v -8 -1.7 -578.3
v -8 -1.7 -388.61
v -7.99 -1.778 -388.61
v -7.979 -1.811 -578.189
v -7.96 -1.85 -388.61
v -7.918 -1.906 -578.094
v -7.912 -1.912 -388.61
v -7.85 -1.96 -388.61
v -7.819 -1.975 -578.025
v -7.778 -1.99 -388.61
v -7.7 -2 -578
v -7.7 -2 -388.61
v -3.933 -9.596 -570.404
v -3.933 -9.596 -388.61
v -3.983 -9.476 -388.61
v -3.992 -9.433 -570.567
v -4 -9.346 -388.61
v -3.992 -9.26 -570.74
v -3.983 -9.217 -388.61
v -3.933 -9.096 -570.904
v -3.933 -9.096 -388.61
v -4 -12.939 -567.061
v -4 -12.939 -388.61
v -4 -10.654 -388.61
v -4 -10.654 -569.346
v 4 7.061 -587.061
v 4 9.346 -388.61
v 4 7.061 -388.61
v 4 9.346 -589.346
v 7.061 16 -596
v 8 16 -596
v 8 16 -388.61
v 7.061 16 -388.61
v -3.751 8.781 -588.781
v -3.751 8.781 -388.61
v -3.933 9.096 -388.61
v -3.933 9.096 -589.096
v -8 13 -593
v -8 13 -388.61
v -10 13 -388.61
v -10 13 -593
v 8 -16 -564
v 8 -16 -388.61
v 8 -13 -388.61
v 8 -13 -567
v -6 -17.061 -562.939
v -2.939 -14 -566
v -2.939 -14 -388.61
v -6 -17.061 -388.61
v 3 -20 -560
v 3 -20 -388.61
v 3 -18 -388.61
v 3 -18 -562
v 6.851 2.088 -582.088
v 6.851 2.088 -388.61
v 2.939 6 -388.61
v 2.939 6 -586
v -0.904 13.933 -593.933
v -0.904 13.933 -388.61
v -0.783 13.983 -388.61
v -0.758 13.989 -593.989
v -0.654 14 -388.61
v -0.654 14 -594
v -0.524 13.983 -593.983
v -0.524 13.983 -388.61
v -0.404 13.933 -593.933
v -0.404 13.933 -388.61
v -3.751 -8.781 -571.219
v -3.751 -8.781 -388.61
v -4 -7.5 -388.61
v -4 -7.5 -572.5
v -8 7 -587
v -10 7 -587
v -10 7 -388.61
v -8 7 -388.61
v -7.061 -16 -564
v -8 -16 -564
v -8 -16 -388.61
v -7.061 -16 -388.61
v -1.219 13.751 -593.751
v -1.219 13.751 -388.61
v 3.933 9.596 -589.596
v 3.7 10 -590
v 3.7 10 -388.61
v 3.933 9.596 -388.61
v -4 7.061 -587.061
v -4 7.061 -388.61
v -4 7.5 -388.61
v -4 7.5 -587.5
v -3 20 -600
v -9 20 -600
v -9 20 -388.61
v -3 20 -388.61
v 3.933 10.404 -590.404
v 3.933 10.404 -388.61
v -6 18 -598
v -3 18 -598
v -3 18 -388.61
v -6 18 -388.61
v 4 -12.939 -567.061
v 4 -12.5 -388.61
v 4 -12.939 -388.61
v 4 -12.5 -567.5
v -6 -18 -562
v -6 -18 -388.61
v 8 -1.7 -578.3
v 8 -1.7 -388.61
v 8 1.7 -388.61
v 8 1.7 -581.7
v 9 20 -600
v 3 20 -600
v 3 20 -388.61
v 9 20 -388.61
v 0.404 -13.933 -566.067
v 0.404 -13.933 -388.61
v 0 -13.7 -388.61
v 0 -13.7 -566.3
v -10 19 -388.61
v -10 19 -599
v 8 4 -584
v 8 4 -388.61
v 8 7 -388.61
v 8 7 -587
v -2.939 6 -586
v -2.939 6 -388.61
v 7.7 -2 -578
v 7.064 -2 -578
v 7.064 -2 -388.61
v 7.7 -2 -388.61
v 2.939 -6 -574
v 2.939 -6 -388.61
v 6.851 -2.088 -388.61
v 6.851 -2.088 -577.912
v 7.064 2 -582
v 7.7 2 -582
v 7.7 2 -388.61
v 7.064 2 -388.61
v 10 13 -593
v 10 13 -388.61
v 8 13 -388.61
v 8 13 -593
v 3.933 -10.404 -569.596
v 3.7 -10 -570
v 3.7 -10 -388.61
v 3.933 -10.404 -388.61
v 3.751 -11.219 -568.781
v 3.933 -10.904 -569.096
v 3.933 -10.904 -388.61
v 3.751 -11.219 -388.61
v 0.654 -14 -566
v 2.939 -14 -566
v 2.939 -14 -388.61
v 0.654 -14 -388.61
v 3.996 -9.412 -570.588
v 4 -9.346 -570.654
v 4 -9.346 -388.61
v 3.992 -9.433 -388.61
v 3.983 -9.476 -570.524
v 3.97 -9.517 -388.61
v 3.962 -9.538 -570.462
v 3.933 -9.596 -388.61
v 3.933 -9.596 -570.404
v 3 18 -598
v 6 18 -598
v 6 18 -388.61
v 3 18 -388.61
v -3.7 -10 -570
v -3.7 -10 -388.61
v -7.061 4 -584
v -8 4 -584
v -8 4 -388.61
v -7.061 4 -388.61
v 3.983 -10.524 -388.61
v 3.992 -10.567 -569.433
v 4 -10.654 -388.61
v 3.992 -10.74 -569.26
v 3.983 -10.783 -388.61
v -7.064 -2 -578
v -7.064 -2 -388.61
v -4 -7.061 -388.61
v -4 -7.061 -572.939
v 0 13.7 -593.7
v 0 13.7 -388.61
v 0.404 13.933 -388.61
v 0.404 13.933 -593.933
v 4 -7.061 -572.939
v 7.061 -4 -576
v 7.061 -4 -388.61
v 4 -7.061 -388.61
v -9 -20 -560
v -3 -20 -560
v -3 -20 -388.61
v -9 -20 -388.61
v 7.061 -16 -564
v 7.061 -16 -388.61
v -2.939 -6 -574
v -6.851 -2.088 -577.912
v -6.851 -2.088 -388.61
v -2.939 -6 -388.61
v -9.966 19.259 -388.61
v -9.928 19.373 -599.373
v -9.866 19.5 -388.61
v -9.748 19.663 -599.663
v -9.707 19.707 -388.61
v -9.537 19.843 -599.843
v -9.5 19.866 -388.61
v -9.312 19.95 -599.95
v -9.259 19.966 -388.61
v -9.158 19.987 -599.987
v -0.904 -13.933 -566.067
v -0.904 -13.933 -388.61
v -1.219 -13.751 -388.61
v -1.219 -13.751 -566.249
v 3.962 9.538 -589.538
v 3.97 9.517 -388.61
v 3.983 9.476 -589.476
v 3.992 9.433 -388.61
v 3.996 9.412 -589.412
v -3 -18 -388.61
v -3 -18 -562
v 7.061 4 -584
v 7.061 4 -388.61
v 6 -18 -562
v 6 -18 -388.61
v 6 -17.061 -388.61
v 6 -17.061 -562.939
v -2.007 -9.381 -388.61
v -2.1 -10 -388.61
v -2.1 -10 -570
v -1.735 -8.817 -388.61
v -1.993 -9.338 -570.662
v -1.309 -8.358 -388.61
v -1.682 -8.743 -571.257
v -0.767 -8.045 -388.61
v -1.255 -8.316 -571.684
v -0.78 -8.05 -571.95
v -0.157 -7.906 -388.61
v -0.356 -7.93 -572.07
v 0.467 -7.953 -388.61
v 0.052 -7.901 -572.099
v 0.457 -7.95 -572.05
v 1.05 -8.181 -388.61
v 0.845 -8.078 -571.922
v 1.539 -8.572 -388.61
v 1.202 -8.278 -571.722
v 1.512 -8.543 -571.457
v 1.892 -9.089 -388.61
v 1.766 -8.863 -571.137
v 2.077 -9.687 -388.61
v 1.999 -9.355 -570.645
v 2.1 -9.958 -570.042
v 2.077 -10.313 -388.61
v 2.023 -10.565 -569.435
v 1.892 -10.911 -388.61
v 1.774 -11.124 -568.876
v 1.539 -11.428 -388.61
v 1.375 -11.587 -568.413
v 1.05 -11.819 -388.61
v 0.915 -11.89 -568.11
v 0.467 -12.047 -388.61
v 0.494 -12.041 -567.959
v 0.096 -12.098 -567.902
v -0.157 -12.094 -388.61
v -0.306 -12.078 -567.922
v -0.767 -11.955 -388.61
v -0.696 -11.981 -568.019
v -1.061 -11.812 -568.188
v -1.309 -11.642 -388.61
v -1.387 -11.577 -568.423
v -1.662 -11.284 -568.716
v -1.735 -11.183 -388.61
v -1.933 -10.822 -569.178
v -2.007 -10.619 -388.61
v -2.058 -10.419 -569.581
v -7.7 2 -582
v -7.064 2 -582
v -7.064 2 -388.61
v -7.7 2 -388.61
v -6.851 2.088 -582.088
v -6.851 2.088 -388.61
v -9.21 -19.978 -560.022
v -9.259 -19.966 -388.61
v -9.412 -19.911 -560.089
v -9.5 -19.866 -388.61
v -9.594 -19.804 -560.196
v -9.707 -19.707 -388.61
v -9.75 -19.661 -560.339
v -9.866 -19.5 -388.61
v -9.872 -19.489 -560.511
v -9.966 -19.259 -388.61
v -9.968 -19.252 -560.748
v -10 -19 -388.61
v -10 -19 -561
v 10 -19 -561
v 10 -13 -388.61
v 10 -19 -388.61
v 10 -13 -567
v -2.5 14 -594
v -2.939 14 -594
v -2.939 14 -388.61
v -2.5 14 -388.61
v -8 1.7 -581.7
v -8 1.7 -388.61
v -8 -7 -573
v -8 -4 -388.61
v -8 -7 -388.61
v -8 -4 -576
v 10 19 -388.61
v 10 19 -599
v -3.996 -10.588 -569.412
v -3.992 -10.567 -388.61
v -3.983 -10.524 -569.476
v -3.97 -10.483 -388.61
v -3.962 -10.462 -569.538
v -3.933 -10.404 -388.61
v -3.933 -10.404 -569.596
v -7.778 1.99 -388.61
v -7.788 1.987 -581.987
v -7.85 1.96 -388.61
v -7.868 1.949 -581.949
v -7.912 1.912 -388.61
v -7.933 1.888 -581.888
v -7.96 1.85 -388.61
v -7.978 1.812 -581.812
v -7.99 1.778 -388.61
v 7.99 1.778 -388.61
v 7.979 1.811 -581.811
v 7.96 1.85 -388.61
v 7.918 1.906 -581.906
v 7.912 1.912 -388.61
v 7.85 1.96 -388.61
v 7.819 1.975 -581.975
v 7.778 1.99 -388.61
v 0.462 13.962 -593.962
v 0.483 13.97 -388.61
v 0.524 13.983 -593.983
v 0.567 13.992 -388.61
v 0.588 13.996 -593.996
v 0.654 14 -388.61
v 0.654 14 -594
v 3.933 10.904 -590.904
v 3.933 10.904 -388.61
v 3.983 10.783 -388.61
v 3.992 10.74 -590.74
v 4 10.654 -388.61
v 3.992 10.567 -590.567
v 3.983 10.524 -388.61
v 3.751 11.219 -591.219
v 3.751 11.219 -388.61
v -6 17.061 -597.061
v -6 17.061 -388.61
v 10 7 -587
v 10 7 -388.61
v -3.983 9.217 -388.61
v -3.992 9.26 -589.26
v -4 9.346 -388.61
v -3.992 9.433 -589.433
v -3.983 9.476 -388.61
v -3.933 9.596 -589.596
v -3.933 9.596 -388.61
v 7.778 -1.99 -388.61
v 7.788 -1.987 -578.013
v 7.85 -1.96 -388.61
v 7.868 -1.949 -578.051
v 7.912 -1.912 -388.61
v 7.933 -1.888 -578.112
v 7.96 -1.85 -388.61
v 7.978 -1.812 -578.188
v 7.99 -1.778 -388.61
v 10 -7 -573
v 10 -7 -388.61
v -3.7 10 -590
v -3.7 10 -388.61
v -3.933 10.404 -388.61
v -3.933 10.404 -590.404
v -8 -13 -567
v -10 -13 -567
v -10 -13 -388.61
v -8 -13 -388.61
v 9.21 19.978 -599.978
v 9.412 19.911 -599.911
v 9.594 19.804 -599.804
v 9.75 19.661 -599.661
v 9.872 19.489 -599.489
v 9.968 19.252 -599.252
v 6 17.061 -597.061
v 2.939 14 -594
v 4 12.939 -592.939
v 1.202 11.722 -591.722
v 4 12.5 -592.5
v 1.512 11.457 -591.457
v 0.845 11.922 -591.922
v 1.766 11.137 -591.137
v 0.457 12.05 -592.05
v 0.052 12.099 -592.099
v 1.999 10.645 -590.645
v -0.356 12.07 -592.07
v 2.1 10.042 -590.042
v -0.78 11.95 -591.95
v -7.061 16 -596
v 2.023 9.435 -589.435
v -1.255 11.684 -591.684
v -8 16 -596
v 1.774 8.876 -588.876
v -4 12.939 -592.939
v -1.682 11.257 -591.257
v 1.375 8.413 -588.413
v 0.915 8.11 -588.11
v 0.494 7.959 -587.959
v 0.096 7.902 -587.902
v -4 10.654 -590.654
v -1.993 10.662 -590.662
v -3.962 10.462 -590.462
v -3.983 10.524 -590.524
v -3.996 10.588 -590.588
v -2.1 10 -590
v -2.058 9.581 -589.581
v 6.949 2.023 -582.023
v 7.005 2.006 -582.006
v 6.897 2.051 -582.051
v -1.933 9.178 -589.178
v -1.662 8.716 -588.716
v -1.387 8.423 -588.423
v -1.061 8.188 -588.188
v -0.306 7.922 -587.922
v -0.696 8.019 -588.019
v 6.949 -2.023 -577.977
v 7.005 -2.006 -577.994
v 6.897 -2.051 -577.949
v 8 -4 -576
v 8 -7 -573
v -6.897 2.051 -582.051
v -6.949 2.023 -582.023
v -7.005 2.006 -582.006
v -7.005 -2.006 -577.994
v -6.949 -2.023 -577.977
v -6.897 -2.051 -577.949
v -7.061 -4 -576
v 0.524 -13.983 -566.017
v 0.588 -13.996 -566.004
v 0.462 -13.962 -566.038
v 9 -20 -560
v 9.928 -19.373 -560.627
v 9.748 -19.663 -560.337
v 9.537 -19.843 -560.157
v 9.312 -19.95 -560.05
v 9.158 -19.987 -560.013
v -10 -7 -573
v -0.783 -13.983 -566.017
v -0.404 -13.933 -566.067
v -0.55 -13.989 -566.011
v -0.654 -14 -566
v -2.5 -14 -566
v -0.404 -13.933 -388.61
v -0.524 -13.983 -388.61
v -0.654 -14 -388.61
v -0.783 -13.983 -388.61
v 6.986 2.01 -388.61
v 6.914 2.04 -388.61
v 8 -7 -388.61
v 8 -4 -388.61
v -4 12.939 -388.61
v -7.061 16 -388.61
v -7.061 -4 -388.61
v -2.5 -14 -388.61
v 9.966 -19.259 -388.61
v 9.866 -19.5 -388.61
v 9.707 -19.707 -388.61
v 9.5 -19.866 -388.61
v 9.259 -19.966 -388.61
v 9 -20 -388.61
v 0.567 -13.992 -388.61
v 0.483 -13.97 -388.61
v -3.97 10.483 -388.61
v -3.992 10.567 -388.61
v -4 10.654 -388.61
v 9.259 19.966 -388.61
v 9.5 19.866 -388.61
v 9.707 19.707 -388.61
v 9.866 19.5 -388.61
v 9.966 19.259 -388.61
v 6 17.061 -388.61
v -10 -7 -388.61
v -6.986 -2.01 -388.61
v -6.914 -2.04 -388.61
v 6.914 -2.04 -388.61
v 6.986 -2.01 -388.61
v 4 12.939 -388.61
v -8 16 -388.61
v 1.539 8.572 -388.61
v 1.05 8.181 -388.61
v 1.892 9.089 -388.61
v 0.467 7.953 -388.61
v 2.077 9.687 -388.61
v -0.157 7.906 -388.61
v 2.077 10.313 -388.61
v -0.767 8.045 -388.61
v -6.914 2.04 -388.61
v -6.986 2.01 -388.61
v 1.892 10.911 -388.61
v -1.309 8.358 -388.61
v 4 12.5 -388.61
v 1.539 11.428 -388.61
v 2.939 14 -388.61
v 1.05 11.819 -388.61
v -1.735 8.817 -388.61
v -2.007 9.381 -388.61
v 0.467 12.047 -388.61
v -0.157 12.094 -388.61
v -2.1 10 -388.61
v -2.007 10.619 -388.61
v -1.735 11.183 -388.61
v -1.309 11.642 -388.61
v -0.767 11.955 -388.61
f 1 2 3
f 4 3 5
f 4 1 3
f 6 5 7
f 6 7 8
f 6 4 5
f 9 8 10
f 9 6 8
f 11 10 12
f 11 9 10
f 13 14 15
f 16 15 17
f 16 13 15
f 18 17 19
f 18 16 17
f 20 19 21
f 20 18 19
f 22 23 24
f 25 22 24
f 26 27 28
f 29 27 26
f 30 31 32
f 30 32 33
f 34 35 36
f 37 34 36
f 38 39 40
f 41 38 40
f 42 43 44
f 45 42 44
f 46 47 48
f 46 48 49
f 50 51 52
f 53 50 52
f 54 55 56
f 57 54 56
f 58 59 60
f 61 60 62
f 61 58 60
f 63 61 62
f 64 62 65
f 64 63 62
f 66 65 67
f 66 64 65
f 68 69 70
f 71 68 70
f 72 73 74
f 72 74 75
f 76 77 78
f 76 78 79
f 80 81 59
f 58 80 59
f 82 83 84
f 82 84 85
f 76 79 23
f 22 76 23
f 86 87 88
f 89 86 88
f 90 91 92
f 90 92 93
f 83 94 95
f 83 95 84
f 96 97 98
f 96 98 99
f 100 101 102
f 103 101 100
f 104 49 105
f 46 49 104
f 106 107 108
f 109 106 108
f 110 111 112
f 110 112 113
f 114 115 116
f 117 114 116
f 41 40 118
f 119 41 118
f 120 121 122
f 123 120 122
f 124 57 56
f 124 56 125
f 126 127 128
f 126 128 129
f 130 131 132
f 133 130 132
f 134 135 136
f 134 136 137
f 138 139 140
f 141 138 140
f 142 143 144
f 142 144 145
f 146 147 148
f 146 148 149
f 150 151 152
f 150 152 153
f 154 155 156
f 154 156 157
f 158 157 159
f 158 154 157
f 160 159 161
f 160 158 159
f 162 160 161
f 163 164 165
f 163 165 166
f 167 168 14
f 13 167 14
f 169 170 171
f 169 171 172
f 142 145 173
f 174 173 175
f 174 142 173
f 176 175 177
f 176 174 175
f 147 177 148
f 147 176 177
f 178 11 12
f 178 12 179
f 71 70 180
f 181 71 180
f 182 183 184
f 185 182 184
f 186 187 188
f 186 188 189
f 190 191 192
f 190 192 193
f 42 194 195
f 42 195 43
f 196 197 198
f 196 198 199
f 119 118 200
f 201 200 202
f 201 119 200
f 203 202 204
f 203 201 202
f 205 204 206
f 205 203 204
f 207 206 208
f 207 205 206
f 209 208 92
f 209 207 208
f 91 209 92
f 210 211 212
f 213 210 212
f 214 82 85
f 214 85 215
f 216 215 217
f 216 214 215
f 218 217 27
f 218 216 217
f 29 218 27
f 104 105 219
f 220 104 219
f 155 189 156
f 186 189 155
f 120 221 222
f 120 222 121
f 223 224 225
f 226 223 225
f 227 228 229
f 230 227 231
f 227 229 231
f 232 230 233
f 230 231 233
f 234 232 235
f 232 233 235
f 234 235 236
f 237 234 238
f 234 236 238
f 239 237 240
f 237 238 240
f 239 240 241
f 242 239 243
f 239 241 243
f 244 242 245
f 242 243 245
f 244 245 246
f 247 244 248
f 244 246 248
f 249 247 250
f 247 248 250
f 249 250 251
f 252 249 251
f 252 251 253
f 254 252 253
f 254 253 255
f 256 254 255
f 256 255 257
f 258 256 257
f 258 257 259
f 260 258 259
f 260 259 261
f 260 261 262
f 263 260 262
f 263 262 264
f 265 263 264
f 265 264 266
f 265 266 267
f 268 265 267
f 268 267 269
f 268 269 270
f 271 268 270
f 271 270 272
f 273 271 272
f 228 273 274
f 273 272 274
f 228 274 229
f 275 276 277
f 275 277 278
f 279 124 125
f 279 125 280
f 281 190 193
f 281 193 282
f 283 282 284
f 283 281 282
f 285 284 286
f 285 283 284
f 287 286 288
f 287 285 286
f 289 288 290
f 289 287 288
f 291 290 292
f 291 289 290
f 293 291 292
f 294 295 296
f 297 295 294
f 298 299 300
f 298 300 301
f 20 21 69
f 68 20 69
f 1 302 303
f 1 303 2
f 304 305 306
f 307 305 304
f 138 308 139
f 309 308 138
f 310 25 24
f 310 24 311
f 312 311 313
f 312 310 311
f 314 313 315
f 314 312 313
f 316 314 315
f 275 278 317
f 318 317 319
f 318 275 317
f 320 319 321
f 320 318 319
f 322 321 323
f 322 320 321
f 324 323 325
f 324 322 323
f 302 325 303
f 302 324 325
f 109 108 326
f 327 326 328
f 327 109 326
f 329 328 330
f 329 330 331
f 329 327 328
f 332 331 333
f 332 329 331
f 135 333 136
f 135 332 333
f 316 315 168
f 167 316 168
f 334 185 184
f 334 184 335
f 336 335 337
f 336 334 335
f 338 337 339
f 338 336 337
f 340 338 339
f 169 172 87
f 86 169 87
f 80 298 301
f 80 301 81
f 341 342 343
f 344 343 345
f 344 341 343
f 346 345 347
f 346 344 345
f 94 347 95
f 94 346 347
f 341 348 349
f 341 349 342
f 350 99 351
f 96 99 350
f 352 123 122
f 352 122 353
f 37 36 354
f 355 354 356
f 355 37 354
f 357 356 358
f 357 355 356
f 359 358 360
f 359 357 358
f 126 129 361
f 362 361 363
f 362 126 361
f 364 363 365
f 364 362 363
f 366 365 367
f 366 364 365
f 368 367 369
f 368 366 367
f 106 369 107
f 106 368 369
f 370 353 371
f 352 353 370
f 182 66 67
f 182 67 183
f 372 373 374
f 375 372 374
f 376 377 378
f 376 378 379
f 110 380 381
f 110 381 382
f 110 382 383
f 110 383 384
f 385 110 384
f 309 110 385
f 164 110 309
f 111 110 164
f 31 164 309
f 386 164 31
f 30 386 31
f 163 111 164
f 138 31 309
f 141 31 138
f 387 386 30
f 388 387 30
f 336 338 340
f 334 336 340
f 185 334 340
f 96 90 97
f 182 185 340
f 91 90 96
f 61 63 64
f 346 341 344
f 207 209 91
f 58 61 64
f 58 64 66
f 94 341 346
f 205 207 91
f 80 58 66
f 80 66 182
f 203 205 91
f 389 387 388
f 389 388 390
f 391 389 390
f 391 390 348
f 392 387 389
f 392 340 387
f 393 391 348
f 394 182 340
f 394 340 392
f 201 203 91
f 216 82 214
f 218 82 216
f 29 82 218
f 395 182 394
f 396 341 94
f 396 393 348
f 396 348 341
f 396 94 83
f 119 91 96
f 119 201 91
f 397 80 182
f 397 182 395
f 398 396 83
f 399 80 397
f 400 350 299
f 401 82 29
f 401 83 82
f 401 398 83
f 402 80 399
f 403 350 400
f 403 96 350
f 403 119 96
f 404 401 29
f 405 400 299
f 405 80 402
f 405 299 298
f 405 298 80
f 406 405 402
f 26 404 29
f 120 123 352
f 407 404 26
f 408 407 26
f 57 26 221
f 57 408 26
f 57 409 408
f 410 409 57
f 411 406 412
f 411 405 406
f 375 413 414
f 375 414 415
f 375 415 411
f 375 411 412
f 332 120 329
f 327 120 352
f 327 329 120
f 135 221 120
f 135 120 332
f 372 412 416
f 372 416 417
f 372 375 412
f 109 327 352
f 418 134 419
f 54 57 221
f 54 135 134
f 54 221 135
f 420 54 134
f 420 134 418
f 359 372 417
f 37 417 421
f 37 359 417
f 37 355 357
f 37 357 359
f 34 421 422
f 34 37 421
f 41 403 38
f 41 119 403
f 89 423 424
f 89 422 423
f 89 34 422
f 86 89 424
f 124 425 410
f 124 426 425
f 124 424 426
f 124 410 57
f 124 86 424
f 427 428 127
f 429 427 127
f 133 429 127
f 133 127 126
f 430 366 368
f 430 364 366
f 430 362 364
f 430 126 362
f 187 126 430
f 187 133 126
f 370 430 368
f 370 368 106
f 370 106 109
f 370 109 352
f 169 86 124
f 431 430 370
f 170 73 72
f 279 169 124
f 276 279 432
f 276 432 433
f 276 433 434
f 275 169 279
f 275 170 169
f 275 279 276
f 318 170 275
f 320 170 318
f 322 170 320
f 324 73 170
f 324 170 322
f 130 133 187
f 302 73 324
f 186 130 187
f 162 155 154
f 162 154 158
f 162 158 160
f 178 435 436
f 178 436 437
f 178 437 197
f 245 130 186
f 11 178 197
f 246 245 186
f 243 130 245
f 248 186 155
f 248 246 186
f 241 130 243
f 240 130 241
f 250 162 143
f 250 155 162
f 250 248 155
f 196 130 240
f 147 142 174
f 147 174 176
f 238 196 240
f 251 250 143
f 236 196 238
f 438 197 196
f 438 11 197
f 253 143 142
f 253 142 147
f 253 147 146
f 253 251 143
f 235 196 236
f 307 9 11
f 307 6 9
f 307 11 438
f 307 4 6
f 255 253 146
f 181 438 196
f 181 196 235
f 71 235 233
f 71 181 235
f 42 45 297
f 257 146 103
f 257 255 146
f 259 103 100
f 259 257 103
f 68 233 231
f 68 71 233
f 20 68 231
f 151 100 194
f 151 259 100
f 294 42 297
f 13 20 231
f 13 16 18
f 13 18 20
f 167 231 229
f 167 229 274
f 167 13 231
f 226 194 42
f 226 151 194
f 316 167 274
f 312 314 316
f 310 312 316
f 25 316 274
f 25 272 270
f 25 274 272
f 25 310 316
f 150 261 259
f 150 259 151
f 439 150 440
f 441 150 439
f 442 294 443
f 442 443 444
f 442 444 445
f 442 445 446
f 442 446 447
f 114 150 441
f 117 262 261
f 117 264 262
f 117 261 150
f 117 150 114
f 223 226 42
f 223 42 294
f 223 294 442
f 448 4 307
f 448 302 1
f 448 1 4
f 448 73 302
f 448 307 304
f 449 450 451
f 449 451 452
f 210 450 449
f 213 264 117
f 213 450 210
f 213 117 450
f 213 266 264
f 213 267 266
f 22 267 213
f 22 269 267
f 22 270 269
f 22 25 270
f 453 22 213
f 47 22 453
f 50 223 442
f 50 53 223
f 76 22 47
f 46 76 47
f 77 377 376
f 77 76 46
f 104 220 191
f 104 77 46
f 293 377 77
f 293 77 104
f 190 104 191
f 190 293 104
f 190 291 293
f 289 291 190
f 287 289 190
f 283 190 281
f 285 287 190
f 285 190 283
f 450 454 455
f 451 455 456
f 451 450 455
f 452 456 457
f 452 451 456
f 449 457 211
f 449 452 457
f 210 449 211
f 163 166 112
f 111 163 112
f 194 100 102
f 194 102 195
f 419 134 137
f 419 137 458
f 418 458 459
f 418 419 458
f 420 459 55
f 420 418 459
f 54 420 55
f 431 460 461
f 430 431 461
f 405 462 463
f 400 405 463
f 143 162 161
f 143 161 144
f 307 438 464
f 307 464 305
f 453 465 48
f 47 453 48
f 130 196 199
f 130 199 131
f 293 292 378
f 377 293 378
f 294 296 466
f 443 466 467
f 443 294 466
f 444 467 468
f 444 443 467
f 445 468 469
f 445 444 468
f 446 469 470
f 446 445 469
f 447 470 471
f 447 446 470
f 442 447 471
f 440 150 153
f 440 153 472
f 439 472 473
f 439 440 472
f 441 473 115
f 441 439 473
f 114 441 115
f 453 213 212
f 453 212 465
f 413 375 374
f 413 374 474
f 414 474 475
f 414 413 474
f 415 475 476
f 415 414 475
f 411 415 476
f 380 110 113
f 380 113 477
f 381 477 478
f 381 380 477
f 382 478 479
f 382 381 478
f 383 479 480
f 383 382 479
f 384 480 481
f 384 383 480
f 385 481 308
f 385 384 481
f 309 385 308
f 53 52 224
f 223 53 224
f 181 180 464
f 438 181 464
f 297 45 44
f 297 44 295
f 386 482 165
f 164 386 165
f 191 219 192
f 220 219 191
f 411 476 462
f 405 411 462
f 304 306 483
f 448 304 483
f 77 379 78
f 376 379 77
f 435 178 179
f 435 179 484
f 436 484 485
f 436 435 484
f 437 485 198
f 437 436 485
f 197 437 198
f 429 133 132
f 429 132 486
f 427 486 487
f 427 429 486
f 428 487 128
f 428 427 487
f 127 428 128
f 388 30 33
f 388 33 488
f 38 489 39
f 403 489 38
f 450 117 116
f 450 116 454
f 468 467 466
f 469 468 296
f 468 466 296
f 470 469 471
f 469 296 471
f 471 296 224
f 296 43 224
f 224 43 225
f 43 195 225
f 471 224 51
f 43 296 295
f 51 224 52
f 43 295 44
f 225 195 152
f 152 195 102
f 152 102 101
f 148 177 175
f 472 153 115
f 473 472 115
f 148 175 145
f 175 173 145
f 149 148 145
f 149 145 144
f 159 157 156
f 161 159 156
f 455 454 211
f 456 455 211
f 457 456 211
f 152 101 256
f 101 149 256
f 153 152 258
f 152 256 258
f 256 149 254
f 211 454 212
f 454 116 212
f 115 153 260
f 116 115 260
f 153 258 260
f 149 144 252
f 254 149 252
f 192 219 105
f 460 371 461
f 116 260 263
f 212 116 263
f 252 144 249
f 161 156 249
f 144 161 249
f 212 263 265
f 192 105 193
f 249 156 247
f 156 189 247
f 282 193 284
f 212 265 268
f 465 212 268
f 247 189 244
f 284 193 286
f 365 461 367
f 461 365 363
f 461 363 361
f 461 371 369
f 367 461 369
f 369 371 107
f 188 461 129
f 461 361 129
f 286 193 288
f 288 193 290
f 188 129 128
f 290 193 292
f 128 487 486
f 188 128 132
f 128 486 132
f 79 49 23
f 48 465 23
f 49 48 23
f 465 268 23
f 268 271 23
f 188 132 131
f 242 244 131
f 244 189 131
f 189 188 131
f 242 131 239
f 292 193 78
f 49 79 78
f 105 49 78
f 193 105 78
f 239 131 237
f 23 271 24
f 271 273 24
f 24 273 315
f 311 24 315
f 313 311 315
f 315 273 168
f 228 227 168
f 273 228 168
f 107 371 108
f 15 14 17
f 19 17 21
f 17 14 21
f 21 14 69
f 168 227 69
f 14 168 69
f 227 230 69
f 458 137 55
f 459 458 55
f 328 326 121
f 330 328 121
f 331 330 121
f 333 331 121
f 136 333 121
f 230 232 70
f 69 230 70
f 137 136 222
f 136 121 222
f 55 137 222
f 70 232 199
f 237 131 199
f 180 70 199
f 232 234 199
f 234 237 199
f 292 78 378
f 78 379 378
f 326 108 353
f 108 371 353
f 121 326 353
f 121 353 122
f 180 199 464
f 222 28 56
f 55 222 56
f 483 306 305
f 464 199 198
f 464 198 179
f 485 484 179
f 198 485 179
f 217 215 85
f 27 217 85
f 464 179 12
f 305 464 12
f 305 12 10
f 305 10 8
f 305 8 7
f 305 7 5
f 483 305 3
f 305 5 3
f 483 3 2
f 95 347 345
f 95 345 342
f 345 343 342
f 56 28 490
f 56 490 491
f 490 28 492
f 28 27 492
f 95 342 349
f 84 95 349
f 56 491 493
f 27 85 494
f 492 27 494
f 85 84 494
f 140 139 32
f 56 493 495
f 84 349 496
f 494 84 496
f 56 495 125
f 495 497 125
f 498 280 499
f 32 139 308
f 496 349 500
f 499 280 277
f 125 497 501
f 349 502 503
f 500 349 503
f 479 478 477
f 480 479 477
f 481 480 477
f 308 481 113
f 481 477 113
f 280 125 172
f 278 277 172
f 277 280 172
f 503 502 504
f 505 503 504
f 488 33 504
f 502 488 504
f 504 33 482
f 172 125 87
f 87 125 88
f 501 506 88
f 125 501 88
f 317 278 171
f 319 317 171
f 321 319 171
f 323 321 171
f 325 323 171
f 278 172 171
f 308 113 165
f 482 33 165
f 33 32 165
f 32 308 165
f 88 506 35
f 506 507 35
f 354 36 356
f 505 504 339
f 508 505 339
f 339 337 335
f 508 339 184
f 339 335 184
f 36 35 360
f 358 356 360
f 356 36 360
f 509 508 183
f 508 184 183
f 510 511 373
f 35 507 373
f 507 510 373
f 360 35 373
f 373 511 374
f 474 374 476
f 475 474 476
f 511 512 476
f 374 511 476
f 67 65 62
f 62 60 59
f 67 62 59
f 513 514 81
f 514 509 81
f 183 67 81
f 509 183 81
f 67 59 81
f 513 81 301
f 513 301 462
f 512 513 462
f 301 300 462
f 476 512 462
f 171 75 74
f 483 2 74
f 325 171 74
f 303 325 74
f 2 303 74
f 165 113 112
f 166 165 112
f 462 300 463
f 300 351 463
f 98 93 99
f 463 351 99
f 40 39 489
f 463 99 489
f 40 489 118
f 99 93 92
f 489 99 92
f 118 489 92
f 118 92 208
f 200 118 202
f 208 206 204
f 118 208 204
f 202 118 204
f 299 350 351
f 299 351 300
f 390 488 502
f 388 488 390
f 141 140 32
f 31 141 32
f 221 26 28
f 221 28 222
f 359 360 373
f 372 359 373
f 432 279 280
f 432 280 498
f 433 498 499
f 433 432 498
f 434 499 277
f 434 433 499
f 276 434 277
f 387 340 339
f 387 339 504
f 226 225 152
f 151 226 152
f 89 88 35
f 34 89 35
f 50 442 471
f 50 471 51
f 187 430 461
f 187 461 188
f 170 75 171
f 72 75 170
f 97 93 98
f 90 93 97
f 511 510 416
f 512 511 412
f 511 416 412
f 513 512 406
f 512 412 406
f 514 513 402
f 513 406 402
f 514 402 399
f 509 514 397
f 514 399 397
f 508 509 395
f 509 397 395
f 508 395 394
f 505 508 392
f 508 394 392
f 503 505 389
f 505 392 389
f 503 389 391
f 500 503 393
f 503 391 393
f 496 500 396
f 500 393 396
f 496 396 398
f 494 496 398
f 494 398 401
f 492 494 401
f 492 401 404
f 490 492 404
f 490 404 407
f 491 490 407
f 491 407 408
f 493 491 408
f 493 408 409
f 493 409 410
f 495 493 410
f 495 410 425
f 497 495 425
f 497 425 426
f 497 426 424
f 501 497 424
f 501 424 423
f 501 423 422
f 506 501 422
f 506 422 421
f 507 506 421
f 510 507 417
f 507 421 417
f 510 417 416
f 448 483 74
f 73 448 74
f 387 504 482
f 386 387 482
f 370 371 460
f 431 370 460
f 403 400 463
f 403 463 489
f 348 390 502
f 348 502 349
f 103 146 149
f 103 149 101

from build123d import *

# Parameters (mm, degrees)
SKETCH1_R           = 2.1
BOSS_EXTRUDE1_DEPTH = 211.39
CUT_EXTRUDE1_DEPTH  = 21


with BuildPart() as part:
    # Sketch1 → Boss-Extrude1 (new body)
    with BuildSketch(Plane(origin=(0, 0, -600), x_dir=(-1, 0, 0), z_dir=(0, 0, -1))):
        with BuildLine():
            Line((10, -7), (10, 7))
            Line((10, 7), (8, 7))
            Line((8, 7), (8, 4))
            Line((8, 4), (7.060660172, 4))
            Line((7.060660172, 4), (4, 7.060660172))
            Line((4, 7.060660172), (4, 7.5))
            Line((4, 7.5), (3.750976592, 8.781114371))
            Line((3.750976592, 8.781114371), (3.933012702, 9.096410162))
            ThreePointArc((3.933012702, 9.096410162), (4, 9.346410162), (3.933012702, 9.596410162))
            Line((3.933012702, 9.596410162), (3.7, 10))
            Line((3.7, 10), (3.933012702, 10.403589838))
            ThreePointArc((3.933012702, 10.403589838), (3.982962913, 10.524180316), (4, 10.653589838))
            Line((4, 10.653589838), (4, 12.939339828))
            Line((4, 12.939339828), (7.060660172, 16))
            Line((7.060660172, 16), (8, 16))
            Line((8, 16), (8, 13))
            Line((8, 13), (10, 13))
            Line((10, 13), (10, 19))
            ThreePointArc((10, 19), (9.707106781, 19.707106781), (9, 20))
            Line((9, 20), (3, 20))
            Line((3, 20), (3, 18))
            Line((3, 18), (6, 18))
            Line((6, 18), (6, 17.060660172))
            Line((6, 17.060660172), (2.939339828, 14))
            Line((2.939339828, 14), (2.5, 14))
            Line((2.5, 14), (1.218885629, 13.750976592))
            Line((1.218885629, 13.750976592), (0.903589838, 13.933012702))
            ThreePointArc((0.903589838, 13.933012702), (0.653589838, 14), (0.403589838, 13.933012702))
            Line((0.403589838, 13.933012702), (0, 13.7))
            Line((0, 13.7), (-0.403589838, 13.933012702))
            ThreePointArc((-0.403589838, 13.933012702), (-0.524180316, 13.982962913), (-0.653589838, 14))
            Line((-0.653589838, 14), (-2.939339828, 14))
            Line((-2.939339828, 14), (-6, 17.060660172))
            Line((-6, 17.060660172), (-6, 18))
            Line((-6, 18), (-3, 18))
            Line((-3, 18), (-3, 20))
            Line((-3, 20), (-9, 20))
            ThreePointArc((-9, 20), (-9.707106781, 19.707106781), (-10, 19))
            Line((-10, 19), (-10, 13))
            Line((-10, 13), (-8, 13))
            Line((-8, 13), (-8, 16))
            Line((-8, 16), (-7.060660172, 16))
            Line((-7.060660172, 16), (-4, 12.939339828))
            Line((-4, 12.939339828), (-4, 12.5))
            Line((-4, 12.5), (-3.750976592, 11.218885629))
            Line((-3.750976592, 11.218885629), (-3.933012702, 10.903589838))
            ThreePointArc((-3.933012702, 10.903589838), (-4, 10.653589838), (-3.933012702, 10.403589838))
            Line((-3.933012702, 10.403589838), (-3.7, 10))
            Line((-3.7, 10), (-3.933012702, 9.596410162))
            ThreePointArc((-3.933012702, 9.596410162), (-3.982962913, 9.475819684), (-4, 9.346410162))
            Line((-4, 9.346410162), (-4, 7.060660172))
            Line((-4, 7.060660172), (-7.060660172, 4))
            Line((-7.060660172, 4), (-8, 4))
            Line((-8, 4), (-8, 7))
            Line((-8, 7), (-10, 7))
            Line((-10, 7), (-10, -7))
            Line((-10, -7), (-8, -7))
            Line((-8, -7), (-8, -4))
            Line((-8, -4), (-7.060660172, -4))
            Line((-7.060660172, -4), (-4, -7.060660172))
            Line((-4, -7.060660172), (-4, -9.346410162))
            ThreePointArc((-4, -9.346410162), (-3.982962913, -9.475819684), (-3.933012702, -9.596410162))
            Line((-3.933012702, -9.596410162), (-3.7, -10))
            Line((-3.7, -10), (-3.933012702, -10.403589838))
            ThreePointArc((-3.933012702, -10.403589838), (-4, -10.653589838), (-3.933012702, -10.903589838))
            Line((-3.933012702, -10.903589838), (-3.750976592, -11.218885629))
            Line((-3.750976592, -11.218885629), (-4, -12.5))
            Line((-4, -12.5), (-4, -12.939339828))
            Line((-4, -12.939339828), (-7.060660172, -16))
            Line((-7.060660172, -16), (-8, -16))
            Line((-8, -16), (-8, -13))
            Line((-8, -13), (-10, -13))
            Line((-10, -13), (-10, -19))
            ThreePointArc((-10, -19), (-9.707106781, -19.707106781), (-9, -20))
            Line((-9, -20), (-3, -20))
            Line((-3, -20), (-3, -18))
            Line((-3, -18), (-6, -18))
            Line((-6, -18), (-6, -17.060660172))
            Line((-6, -17.060660172), (-2.939339828, -14))
            Line((-2.939339828, -14), (-0.653589838, -14))
            ThreePointArc((-0.653589838, -14), (-0.524180316, -13.982962913), (-0.403589838, -13.933012702))
            Line((-0.403589838, -13.933012702), (0, -13.7))
            Line((0, -13.7), (0.403589839, -13.933012702))
            ThreePointArc((0.403589839, -13.933012702), (0.653589839, -14), (0.903589838, -13.933012702))
            Line((0.903589838, -13.933012702), (1.218885629, -13.750976592))
            Line((1.218885629, -13.750976592), (2.5, -14))
            Line((2.5, -14), (2.939339828, -14))
            Line((2.939339828, -14), (6, -17.060660172))
            Line((6, -17.060660172), (6, -18))
            Line((6, -18), (3, -18))
            Line((3, -18), (3, -20))
            Line((3, -20), (9, -20))
            ThreePointArc((9, -20), (9.707106781, -19.707106781), (10, -19))
            Line((10, -19), (10, -13))
            Line((10, -13), (8, -13))
            Line((8, -13), (8, -16))
            Line((8, -16), (7.060660172, -16))
            Line((7.060660172, -16), (4, -12.939339828))
            Line((4, -12.939339828), (4, -10.653589838))
            ThreePointArc((4, -10.653589838), (3.982962913, -10.524180316), (3.933012702, -10.403589838))
            Line((3.933012702, -10.403589838), (3.7, -10))
            Line((3.7, -10), (3.933012702, -9.596410162))
            ThreePointArc((3.933012702, -9.596410162), (4, -9.346410162), (3.933012702, -9.096410162))
            Line((3.933012702, -9.096410162), (3.750976592, -8.781114371))
            Line((3.750976592, -8.781114371), (4, -7.5))
            Line((4, -7.5), (4, -7.060660172))
            Line((4, -7.060660172), (7.060660172, -4))
            Line((7.060660172, -4), (8, -4))
            Line((8, -4), (8, -7))
            Line((8, -7), (10, -7))
        make_face()
        with Locations((0, -10)):
            Circle(SKETCH1_R, mode=Mode.SUBTRACT)
        with Locations((0, 10)):
            Circle(SKETCH1_R, mode=Mode.SUBTRACT)
        with BuildLine():
            Line((8, 1.7), (8, -1.7))
            ThreePointArc((8, -1.7), (7.912132034, -1.912132034), (7.7, -2))
            Line((7.7, -2), (7.063603897, -2))
            ThreePointArc((7.063603897, -2), (6.948798867, -2.02283614), (6.851471863, -2.087867966))
            Line((6.851471863, -2.087867966), (2.939339828, -6))
            Line((2.939339828, -6), (-2.939339828, -6))
            Line((-2.939339828, -6), (-6.851471863, -2.087867966))
            ThreePointArc((-6.851471863, -2.087867966), (-6.948798867, -2.02283614), (-7.063603897, -2))
            Line((-7.063603897, -2), (-7.7, -2))
            ThreePointArc((-7.7, -2), (-7.912132034, -1.912132034), (-8, -1.7))
            Line((-8, -1.7), (-8, 1.7))
            ThreePointArc((-8, 1.7), (-7.912132034, 1.912132034), (-7.7, 2))
            Line((-7.7, 2), (-7.063603897, 2))
            ThreePointArc((-7.063603897, 2), (-6.948798867, 2.02283614), (-6.851471863, 2.087867966))
            Line((-6.851471863, 2.087867966), (-2.939339828, 6))
            Line((-2.939339828, 6), (2.939339828, 6))
            Line((2.939339828, 6), (6.851471863, 2.087867966))
            ThreePointArc((6.851471863, 2.087867966), (6.948798867, 2.02283614), (7.063603897, 2))
            Line((7.063603897, 2), (7.7, 2))
            ThreePointArc((7.7, 2), (7.912132034, 1.912132034), (8, 1.7))
        make_face(mode=Mode.SUBTRACT)
    extrude(amount=-BOSS_EXTRUDE1_DEPTH)

    # Sketch2 → Cut-Extrude1 (cut, through all)
    with BuildSketch(Plane.ZY.offset(10)):
        Polygon((-600, 20), (-560, -20), (-600, -20), align=None)
    extrude(amount=-CUT_EXTRUDE1_DEPTH, mode=Mode.SUBTRACT)


solid = part.part
